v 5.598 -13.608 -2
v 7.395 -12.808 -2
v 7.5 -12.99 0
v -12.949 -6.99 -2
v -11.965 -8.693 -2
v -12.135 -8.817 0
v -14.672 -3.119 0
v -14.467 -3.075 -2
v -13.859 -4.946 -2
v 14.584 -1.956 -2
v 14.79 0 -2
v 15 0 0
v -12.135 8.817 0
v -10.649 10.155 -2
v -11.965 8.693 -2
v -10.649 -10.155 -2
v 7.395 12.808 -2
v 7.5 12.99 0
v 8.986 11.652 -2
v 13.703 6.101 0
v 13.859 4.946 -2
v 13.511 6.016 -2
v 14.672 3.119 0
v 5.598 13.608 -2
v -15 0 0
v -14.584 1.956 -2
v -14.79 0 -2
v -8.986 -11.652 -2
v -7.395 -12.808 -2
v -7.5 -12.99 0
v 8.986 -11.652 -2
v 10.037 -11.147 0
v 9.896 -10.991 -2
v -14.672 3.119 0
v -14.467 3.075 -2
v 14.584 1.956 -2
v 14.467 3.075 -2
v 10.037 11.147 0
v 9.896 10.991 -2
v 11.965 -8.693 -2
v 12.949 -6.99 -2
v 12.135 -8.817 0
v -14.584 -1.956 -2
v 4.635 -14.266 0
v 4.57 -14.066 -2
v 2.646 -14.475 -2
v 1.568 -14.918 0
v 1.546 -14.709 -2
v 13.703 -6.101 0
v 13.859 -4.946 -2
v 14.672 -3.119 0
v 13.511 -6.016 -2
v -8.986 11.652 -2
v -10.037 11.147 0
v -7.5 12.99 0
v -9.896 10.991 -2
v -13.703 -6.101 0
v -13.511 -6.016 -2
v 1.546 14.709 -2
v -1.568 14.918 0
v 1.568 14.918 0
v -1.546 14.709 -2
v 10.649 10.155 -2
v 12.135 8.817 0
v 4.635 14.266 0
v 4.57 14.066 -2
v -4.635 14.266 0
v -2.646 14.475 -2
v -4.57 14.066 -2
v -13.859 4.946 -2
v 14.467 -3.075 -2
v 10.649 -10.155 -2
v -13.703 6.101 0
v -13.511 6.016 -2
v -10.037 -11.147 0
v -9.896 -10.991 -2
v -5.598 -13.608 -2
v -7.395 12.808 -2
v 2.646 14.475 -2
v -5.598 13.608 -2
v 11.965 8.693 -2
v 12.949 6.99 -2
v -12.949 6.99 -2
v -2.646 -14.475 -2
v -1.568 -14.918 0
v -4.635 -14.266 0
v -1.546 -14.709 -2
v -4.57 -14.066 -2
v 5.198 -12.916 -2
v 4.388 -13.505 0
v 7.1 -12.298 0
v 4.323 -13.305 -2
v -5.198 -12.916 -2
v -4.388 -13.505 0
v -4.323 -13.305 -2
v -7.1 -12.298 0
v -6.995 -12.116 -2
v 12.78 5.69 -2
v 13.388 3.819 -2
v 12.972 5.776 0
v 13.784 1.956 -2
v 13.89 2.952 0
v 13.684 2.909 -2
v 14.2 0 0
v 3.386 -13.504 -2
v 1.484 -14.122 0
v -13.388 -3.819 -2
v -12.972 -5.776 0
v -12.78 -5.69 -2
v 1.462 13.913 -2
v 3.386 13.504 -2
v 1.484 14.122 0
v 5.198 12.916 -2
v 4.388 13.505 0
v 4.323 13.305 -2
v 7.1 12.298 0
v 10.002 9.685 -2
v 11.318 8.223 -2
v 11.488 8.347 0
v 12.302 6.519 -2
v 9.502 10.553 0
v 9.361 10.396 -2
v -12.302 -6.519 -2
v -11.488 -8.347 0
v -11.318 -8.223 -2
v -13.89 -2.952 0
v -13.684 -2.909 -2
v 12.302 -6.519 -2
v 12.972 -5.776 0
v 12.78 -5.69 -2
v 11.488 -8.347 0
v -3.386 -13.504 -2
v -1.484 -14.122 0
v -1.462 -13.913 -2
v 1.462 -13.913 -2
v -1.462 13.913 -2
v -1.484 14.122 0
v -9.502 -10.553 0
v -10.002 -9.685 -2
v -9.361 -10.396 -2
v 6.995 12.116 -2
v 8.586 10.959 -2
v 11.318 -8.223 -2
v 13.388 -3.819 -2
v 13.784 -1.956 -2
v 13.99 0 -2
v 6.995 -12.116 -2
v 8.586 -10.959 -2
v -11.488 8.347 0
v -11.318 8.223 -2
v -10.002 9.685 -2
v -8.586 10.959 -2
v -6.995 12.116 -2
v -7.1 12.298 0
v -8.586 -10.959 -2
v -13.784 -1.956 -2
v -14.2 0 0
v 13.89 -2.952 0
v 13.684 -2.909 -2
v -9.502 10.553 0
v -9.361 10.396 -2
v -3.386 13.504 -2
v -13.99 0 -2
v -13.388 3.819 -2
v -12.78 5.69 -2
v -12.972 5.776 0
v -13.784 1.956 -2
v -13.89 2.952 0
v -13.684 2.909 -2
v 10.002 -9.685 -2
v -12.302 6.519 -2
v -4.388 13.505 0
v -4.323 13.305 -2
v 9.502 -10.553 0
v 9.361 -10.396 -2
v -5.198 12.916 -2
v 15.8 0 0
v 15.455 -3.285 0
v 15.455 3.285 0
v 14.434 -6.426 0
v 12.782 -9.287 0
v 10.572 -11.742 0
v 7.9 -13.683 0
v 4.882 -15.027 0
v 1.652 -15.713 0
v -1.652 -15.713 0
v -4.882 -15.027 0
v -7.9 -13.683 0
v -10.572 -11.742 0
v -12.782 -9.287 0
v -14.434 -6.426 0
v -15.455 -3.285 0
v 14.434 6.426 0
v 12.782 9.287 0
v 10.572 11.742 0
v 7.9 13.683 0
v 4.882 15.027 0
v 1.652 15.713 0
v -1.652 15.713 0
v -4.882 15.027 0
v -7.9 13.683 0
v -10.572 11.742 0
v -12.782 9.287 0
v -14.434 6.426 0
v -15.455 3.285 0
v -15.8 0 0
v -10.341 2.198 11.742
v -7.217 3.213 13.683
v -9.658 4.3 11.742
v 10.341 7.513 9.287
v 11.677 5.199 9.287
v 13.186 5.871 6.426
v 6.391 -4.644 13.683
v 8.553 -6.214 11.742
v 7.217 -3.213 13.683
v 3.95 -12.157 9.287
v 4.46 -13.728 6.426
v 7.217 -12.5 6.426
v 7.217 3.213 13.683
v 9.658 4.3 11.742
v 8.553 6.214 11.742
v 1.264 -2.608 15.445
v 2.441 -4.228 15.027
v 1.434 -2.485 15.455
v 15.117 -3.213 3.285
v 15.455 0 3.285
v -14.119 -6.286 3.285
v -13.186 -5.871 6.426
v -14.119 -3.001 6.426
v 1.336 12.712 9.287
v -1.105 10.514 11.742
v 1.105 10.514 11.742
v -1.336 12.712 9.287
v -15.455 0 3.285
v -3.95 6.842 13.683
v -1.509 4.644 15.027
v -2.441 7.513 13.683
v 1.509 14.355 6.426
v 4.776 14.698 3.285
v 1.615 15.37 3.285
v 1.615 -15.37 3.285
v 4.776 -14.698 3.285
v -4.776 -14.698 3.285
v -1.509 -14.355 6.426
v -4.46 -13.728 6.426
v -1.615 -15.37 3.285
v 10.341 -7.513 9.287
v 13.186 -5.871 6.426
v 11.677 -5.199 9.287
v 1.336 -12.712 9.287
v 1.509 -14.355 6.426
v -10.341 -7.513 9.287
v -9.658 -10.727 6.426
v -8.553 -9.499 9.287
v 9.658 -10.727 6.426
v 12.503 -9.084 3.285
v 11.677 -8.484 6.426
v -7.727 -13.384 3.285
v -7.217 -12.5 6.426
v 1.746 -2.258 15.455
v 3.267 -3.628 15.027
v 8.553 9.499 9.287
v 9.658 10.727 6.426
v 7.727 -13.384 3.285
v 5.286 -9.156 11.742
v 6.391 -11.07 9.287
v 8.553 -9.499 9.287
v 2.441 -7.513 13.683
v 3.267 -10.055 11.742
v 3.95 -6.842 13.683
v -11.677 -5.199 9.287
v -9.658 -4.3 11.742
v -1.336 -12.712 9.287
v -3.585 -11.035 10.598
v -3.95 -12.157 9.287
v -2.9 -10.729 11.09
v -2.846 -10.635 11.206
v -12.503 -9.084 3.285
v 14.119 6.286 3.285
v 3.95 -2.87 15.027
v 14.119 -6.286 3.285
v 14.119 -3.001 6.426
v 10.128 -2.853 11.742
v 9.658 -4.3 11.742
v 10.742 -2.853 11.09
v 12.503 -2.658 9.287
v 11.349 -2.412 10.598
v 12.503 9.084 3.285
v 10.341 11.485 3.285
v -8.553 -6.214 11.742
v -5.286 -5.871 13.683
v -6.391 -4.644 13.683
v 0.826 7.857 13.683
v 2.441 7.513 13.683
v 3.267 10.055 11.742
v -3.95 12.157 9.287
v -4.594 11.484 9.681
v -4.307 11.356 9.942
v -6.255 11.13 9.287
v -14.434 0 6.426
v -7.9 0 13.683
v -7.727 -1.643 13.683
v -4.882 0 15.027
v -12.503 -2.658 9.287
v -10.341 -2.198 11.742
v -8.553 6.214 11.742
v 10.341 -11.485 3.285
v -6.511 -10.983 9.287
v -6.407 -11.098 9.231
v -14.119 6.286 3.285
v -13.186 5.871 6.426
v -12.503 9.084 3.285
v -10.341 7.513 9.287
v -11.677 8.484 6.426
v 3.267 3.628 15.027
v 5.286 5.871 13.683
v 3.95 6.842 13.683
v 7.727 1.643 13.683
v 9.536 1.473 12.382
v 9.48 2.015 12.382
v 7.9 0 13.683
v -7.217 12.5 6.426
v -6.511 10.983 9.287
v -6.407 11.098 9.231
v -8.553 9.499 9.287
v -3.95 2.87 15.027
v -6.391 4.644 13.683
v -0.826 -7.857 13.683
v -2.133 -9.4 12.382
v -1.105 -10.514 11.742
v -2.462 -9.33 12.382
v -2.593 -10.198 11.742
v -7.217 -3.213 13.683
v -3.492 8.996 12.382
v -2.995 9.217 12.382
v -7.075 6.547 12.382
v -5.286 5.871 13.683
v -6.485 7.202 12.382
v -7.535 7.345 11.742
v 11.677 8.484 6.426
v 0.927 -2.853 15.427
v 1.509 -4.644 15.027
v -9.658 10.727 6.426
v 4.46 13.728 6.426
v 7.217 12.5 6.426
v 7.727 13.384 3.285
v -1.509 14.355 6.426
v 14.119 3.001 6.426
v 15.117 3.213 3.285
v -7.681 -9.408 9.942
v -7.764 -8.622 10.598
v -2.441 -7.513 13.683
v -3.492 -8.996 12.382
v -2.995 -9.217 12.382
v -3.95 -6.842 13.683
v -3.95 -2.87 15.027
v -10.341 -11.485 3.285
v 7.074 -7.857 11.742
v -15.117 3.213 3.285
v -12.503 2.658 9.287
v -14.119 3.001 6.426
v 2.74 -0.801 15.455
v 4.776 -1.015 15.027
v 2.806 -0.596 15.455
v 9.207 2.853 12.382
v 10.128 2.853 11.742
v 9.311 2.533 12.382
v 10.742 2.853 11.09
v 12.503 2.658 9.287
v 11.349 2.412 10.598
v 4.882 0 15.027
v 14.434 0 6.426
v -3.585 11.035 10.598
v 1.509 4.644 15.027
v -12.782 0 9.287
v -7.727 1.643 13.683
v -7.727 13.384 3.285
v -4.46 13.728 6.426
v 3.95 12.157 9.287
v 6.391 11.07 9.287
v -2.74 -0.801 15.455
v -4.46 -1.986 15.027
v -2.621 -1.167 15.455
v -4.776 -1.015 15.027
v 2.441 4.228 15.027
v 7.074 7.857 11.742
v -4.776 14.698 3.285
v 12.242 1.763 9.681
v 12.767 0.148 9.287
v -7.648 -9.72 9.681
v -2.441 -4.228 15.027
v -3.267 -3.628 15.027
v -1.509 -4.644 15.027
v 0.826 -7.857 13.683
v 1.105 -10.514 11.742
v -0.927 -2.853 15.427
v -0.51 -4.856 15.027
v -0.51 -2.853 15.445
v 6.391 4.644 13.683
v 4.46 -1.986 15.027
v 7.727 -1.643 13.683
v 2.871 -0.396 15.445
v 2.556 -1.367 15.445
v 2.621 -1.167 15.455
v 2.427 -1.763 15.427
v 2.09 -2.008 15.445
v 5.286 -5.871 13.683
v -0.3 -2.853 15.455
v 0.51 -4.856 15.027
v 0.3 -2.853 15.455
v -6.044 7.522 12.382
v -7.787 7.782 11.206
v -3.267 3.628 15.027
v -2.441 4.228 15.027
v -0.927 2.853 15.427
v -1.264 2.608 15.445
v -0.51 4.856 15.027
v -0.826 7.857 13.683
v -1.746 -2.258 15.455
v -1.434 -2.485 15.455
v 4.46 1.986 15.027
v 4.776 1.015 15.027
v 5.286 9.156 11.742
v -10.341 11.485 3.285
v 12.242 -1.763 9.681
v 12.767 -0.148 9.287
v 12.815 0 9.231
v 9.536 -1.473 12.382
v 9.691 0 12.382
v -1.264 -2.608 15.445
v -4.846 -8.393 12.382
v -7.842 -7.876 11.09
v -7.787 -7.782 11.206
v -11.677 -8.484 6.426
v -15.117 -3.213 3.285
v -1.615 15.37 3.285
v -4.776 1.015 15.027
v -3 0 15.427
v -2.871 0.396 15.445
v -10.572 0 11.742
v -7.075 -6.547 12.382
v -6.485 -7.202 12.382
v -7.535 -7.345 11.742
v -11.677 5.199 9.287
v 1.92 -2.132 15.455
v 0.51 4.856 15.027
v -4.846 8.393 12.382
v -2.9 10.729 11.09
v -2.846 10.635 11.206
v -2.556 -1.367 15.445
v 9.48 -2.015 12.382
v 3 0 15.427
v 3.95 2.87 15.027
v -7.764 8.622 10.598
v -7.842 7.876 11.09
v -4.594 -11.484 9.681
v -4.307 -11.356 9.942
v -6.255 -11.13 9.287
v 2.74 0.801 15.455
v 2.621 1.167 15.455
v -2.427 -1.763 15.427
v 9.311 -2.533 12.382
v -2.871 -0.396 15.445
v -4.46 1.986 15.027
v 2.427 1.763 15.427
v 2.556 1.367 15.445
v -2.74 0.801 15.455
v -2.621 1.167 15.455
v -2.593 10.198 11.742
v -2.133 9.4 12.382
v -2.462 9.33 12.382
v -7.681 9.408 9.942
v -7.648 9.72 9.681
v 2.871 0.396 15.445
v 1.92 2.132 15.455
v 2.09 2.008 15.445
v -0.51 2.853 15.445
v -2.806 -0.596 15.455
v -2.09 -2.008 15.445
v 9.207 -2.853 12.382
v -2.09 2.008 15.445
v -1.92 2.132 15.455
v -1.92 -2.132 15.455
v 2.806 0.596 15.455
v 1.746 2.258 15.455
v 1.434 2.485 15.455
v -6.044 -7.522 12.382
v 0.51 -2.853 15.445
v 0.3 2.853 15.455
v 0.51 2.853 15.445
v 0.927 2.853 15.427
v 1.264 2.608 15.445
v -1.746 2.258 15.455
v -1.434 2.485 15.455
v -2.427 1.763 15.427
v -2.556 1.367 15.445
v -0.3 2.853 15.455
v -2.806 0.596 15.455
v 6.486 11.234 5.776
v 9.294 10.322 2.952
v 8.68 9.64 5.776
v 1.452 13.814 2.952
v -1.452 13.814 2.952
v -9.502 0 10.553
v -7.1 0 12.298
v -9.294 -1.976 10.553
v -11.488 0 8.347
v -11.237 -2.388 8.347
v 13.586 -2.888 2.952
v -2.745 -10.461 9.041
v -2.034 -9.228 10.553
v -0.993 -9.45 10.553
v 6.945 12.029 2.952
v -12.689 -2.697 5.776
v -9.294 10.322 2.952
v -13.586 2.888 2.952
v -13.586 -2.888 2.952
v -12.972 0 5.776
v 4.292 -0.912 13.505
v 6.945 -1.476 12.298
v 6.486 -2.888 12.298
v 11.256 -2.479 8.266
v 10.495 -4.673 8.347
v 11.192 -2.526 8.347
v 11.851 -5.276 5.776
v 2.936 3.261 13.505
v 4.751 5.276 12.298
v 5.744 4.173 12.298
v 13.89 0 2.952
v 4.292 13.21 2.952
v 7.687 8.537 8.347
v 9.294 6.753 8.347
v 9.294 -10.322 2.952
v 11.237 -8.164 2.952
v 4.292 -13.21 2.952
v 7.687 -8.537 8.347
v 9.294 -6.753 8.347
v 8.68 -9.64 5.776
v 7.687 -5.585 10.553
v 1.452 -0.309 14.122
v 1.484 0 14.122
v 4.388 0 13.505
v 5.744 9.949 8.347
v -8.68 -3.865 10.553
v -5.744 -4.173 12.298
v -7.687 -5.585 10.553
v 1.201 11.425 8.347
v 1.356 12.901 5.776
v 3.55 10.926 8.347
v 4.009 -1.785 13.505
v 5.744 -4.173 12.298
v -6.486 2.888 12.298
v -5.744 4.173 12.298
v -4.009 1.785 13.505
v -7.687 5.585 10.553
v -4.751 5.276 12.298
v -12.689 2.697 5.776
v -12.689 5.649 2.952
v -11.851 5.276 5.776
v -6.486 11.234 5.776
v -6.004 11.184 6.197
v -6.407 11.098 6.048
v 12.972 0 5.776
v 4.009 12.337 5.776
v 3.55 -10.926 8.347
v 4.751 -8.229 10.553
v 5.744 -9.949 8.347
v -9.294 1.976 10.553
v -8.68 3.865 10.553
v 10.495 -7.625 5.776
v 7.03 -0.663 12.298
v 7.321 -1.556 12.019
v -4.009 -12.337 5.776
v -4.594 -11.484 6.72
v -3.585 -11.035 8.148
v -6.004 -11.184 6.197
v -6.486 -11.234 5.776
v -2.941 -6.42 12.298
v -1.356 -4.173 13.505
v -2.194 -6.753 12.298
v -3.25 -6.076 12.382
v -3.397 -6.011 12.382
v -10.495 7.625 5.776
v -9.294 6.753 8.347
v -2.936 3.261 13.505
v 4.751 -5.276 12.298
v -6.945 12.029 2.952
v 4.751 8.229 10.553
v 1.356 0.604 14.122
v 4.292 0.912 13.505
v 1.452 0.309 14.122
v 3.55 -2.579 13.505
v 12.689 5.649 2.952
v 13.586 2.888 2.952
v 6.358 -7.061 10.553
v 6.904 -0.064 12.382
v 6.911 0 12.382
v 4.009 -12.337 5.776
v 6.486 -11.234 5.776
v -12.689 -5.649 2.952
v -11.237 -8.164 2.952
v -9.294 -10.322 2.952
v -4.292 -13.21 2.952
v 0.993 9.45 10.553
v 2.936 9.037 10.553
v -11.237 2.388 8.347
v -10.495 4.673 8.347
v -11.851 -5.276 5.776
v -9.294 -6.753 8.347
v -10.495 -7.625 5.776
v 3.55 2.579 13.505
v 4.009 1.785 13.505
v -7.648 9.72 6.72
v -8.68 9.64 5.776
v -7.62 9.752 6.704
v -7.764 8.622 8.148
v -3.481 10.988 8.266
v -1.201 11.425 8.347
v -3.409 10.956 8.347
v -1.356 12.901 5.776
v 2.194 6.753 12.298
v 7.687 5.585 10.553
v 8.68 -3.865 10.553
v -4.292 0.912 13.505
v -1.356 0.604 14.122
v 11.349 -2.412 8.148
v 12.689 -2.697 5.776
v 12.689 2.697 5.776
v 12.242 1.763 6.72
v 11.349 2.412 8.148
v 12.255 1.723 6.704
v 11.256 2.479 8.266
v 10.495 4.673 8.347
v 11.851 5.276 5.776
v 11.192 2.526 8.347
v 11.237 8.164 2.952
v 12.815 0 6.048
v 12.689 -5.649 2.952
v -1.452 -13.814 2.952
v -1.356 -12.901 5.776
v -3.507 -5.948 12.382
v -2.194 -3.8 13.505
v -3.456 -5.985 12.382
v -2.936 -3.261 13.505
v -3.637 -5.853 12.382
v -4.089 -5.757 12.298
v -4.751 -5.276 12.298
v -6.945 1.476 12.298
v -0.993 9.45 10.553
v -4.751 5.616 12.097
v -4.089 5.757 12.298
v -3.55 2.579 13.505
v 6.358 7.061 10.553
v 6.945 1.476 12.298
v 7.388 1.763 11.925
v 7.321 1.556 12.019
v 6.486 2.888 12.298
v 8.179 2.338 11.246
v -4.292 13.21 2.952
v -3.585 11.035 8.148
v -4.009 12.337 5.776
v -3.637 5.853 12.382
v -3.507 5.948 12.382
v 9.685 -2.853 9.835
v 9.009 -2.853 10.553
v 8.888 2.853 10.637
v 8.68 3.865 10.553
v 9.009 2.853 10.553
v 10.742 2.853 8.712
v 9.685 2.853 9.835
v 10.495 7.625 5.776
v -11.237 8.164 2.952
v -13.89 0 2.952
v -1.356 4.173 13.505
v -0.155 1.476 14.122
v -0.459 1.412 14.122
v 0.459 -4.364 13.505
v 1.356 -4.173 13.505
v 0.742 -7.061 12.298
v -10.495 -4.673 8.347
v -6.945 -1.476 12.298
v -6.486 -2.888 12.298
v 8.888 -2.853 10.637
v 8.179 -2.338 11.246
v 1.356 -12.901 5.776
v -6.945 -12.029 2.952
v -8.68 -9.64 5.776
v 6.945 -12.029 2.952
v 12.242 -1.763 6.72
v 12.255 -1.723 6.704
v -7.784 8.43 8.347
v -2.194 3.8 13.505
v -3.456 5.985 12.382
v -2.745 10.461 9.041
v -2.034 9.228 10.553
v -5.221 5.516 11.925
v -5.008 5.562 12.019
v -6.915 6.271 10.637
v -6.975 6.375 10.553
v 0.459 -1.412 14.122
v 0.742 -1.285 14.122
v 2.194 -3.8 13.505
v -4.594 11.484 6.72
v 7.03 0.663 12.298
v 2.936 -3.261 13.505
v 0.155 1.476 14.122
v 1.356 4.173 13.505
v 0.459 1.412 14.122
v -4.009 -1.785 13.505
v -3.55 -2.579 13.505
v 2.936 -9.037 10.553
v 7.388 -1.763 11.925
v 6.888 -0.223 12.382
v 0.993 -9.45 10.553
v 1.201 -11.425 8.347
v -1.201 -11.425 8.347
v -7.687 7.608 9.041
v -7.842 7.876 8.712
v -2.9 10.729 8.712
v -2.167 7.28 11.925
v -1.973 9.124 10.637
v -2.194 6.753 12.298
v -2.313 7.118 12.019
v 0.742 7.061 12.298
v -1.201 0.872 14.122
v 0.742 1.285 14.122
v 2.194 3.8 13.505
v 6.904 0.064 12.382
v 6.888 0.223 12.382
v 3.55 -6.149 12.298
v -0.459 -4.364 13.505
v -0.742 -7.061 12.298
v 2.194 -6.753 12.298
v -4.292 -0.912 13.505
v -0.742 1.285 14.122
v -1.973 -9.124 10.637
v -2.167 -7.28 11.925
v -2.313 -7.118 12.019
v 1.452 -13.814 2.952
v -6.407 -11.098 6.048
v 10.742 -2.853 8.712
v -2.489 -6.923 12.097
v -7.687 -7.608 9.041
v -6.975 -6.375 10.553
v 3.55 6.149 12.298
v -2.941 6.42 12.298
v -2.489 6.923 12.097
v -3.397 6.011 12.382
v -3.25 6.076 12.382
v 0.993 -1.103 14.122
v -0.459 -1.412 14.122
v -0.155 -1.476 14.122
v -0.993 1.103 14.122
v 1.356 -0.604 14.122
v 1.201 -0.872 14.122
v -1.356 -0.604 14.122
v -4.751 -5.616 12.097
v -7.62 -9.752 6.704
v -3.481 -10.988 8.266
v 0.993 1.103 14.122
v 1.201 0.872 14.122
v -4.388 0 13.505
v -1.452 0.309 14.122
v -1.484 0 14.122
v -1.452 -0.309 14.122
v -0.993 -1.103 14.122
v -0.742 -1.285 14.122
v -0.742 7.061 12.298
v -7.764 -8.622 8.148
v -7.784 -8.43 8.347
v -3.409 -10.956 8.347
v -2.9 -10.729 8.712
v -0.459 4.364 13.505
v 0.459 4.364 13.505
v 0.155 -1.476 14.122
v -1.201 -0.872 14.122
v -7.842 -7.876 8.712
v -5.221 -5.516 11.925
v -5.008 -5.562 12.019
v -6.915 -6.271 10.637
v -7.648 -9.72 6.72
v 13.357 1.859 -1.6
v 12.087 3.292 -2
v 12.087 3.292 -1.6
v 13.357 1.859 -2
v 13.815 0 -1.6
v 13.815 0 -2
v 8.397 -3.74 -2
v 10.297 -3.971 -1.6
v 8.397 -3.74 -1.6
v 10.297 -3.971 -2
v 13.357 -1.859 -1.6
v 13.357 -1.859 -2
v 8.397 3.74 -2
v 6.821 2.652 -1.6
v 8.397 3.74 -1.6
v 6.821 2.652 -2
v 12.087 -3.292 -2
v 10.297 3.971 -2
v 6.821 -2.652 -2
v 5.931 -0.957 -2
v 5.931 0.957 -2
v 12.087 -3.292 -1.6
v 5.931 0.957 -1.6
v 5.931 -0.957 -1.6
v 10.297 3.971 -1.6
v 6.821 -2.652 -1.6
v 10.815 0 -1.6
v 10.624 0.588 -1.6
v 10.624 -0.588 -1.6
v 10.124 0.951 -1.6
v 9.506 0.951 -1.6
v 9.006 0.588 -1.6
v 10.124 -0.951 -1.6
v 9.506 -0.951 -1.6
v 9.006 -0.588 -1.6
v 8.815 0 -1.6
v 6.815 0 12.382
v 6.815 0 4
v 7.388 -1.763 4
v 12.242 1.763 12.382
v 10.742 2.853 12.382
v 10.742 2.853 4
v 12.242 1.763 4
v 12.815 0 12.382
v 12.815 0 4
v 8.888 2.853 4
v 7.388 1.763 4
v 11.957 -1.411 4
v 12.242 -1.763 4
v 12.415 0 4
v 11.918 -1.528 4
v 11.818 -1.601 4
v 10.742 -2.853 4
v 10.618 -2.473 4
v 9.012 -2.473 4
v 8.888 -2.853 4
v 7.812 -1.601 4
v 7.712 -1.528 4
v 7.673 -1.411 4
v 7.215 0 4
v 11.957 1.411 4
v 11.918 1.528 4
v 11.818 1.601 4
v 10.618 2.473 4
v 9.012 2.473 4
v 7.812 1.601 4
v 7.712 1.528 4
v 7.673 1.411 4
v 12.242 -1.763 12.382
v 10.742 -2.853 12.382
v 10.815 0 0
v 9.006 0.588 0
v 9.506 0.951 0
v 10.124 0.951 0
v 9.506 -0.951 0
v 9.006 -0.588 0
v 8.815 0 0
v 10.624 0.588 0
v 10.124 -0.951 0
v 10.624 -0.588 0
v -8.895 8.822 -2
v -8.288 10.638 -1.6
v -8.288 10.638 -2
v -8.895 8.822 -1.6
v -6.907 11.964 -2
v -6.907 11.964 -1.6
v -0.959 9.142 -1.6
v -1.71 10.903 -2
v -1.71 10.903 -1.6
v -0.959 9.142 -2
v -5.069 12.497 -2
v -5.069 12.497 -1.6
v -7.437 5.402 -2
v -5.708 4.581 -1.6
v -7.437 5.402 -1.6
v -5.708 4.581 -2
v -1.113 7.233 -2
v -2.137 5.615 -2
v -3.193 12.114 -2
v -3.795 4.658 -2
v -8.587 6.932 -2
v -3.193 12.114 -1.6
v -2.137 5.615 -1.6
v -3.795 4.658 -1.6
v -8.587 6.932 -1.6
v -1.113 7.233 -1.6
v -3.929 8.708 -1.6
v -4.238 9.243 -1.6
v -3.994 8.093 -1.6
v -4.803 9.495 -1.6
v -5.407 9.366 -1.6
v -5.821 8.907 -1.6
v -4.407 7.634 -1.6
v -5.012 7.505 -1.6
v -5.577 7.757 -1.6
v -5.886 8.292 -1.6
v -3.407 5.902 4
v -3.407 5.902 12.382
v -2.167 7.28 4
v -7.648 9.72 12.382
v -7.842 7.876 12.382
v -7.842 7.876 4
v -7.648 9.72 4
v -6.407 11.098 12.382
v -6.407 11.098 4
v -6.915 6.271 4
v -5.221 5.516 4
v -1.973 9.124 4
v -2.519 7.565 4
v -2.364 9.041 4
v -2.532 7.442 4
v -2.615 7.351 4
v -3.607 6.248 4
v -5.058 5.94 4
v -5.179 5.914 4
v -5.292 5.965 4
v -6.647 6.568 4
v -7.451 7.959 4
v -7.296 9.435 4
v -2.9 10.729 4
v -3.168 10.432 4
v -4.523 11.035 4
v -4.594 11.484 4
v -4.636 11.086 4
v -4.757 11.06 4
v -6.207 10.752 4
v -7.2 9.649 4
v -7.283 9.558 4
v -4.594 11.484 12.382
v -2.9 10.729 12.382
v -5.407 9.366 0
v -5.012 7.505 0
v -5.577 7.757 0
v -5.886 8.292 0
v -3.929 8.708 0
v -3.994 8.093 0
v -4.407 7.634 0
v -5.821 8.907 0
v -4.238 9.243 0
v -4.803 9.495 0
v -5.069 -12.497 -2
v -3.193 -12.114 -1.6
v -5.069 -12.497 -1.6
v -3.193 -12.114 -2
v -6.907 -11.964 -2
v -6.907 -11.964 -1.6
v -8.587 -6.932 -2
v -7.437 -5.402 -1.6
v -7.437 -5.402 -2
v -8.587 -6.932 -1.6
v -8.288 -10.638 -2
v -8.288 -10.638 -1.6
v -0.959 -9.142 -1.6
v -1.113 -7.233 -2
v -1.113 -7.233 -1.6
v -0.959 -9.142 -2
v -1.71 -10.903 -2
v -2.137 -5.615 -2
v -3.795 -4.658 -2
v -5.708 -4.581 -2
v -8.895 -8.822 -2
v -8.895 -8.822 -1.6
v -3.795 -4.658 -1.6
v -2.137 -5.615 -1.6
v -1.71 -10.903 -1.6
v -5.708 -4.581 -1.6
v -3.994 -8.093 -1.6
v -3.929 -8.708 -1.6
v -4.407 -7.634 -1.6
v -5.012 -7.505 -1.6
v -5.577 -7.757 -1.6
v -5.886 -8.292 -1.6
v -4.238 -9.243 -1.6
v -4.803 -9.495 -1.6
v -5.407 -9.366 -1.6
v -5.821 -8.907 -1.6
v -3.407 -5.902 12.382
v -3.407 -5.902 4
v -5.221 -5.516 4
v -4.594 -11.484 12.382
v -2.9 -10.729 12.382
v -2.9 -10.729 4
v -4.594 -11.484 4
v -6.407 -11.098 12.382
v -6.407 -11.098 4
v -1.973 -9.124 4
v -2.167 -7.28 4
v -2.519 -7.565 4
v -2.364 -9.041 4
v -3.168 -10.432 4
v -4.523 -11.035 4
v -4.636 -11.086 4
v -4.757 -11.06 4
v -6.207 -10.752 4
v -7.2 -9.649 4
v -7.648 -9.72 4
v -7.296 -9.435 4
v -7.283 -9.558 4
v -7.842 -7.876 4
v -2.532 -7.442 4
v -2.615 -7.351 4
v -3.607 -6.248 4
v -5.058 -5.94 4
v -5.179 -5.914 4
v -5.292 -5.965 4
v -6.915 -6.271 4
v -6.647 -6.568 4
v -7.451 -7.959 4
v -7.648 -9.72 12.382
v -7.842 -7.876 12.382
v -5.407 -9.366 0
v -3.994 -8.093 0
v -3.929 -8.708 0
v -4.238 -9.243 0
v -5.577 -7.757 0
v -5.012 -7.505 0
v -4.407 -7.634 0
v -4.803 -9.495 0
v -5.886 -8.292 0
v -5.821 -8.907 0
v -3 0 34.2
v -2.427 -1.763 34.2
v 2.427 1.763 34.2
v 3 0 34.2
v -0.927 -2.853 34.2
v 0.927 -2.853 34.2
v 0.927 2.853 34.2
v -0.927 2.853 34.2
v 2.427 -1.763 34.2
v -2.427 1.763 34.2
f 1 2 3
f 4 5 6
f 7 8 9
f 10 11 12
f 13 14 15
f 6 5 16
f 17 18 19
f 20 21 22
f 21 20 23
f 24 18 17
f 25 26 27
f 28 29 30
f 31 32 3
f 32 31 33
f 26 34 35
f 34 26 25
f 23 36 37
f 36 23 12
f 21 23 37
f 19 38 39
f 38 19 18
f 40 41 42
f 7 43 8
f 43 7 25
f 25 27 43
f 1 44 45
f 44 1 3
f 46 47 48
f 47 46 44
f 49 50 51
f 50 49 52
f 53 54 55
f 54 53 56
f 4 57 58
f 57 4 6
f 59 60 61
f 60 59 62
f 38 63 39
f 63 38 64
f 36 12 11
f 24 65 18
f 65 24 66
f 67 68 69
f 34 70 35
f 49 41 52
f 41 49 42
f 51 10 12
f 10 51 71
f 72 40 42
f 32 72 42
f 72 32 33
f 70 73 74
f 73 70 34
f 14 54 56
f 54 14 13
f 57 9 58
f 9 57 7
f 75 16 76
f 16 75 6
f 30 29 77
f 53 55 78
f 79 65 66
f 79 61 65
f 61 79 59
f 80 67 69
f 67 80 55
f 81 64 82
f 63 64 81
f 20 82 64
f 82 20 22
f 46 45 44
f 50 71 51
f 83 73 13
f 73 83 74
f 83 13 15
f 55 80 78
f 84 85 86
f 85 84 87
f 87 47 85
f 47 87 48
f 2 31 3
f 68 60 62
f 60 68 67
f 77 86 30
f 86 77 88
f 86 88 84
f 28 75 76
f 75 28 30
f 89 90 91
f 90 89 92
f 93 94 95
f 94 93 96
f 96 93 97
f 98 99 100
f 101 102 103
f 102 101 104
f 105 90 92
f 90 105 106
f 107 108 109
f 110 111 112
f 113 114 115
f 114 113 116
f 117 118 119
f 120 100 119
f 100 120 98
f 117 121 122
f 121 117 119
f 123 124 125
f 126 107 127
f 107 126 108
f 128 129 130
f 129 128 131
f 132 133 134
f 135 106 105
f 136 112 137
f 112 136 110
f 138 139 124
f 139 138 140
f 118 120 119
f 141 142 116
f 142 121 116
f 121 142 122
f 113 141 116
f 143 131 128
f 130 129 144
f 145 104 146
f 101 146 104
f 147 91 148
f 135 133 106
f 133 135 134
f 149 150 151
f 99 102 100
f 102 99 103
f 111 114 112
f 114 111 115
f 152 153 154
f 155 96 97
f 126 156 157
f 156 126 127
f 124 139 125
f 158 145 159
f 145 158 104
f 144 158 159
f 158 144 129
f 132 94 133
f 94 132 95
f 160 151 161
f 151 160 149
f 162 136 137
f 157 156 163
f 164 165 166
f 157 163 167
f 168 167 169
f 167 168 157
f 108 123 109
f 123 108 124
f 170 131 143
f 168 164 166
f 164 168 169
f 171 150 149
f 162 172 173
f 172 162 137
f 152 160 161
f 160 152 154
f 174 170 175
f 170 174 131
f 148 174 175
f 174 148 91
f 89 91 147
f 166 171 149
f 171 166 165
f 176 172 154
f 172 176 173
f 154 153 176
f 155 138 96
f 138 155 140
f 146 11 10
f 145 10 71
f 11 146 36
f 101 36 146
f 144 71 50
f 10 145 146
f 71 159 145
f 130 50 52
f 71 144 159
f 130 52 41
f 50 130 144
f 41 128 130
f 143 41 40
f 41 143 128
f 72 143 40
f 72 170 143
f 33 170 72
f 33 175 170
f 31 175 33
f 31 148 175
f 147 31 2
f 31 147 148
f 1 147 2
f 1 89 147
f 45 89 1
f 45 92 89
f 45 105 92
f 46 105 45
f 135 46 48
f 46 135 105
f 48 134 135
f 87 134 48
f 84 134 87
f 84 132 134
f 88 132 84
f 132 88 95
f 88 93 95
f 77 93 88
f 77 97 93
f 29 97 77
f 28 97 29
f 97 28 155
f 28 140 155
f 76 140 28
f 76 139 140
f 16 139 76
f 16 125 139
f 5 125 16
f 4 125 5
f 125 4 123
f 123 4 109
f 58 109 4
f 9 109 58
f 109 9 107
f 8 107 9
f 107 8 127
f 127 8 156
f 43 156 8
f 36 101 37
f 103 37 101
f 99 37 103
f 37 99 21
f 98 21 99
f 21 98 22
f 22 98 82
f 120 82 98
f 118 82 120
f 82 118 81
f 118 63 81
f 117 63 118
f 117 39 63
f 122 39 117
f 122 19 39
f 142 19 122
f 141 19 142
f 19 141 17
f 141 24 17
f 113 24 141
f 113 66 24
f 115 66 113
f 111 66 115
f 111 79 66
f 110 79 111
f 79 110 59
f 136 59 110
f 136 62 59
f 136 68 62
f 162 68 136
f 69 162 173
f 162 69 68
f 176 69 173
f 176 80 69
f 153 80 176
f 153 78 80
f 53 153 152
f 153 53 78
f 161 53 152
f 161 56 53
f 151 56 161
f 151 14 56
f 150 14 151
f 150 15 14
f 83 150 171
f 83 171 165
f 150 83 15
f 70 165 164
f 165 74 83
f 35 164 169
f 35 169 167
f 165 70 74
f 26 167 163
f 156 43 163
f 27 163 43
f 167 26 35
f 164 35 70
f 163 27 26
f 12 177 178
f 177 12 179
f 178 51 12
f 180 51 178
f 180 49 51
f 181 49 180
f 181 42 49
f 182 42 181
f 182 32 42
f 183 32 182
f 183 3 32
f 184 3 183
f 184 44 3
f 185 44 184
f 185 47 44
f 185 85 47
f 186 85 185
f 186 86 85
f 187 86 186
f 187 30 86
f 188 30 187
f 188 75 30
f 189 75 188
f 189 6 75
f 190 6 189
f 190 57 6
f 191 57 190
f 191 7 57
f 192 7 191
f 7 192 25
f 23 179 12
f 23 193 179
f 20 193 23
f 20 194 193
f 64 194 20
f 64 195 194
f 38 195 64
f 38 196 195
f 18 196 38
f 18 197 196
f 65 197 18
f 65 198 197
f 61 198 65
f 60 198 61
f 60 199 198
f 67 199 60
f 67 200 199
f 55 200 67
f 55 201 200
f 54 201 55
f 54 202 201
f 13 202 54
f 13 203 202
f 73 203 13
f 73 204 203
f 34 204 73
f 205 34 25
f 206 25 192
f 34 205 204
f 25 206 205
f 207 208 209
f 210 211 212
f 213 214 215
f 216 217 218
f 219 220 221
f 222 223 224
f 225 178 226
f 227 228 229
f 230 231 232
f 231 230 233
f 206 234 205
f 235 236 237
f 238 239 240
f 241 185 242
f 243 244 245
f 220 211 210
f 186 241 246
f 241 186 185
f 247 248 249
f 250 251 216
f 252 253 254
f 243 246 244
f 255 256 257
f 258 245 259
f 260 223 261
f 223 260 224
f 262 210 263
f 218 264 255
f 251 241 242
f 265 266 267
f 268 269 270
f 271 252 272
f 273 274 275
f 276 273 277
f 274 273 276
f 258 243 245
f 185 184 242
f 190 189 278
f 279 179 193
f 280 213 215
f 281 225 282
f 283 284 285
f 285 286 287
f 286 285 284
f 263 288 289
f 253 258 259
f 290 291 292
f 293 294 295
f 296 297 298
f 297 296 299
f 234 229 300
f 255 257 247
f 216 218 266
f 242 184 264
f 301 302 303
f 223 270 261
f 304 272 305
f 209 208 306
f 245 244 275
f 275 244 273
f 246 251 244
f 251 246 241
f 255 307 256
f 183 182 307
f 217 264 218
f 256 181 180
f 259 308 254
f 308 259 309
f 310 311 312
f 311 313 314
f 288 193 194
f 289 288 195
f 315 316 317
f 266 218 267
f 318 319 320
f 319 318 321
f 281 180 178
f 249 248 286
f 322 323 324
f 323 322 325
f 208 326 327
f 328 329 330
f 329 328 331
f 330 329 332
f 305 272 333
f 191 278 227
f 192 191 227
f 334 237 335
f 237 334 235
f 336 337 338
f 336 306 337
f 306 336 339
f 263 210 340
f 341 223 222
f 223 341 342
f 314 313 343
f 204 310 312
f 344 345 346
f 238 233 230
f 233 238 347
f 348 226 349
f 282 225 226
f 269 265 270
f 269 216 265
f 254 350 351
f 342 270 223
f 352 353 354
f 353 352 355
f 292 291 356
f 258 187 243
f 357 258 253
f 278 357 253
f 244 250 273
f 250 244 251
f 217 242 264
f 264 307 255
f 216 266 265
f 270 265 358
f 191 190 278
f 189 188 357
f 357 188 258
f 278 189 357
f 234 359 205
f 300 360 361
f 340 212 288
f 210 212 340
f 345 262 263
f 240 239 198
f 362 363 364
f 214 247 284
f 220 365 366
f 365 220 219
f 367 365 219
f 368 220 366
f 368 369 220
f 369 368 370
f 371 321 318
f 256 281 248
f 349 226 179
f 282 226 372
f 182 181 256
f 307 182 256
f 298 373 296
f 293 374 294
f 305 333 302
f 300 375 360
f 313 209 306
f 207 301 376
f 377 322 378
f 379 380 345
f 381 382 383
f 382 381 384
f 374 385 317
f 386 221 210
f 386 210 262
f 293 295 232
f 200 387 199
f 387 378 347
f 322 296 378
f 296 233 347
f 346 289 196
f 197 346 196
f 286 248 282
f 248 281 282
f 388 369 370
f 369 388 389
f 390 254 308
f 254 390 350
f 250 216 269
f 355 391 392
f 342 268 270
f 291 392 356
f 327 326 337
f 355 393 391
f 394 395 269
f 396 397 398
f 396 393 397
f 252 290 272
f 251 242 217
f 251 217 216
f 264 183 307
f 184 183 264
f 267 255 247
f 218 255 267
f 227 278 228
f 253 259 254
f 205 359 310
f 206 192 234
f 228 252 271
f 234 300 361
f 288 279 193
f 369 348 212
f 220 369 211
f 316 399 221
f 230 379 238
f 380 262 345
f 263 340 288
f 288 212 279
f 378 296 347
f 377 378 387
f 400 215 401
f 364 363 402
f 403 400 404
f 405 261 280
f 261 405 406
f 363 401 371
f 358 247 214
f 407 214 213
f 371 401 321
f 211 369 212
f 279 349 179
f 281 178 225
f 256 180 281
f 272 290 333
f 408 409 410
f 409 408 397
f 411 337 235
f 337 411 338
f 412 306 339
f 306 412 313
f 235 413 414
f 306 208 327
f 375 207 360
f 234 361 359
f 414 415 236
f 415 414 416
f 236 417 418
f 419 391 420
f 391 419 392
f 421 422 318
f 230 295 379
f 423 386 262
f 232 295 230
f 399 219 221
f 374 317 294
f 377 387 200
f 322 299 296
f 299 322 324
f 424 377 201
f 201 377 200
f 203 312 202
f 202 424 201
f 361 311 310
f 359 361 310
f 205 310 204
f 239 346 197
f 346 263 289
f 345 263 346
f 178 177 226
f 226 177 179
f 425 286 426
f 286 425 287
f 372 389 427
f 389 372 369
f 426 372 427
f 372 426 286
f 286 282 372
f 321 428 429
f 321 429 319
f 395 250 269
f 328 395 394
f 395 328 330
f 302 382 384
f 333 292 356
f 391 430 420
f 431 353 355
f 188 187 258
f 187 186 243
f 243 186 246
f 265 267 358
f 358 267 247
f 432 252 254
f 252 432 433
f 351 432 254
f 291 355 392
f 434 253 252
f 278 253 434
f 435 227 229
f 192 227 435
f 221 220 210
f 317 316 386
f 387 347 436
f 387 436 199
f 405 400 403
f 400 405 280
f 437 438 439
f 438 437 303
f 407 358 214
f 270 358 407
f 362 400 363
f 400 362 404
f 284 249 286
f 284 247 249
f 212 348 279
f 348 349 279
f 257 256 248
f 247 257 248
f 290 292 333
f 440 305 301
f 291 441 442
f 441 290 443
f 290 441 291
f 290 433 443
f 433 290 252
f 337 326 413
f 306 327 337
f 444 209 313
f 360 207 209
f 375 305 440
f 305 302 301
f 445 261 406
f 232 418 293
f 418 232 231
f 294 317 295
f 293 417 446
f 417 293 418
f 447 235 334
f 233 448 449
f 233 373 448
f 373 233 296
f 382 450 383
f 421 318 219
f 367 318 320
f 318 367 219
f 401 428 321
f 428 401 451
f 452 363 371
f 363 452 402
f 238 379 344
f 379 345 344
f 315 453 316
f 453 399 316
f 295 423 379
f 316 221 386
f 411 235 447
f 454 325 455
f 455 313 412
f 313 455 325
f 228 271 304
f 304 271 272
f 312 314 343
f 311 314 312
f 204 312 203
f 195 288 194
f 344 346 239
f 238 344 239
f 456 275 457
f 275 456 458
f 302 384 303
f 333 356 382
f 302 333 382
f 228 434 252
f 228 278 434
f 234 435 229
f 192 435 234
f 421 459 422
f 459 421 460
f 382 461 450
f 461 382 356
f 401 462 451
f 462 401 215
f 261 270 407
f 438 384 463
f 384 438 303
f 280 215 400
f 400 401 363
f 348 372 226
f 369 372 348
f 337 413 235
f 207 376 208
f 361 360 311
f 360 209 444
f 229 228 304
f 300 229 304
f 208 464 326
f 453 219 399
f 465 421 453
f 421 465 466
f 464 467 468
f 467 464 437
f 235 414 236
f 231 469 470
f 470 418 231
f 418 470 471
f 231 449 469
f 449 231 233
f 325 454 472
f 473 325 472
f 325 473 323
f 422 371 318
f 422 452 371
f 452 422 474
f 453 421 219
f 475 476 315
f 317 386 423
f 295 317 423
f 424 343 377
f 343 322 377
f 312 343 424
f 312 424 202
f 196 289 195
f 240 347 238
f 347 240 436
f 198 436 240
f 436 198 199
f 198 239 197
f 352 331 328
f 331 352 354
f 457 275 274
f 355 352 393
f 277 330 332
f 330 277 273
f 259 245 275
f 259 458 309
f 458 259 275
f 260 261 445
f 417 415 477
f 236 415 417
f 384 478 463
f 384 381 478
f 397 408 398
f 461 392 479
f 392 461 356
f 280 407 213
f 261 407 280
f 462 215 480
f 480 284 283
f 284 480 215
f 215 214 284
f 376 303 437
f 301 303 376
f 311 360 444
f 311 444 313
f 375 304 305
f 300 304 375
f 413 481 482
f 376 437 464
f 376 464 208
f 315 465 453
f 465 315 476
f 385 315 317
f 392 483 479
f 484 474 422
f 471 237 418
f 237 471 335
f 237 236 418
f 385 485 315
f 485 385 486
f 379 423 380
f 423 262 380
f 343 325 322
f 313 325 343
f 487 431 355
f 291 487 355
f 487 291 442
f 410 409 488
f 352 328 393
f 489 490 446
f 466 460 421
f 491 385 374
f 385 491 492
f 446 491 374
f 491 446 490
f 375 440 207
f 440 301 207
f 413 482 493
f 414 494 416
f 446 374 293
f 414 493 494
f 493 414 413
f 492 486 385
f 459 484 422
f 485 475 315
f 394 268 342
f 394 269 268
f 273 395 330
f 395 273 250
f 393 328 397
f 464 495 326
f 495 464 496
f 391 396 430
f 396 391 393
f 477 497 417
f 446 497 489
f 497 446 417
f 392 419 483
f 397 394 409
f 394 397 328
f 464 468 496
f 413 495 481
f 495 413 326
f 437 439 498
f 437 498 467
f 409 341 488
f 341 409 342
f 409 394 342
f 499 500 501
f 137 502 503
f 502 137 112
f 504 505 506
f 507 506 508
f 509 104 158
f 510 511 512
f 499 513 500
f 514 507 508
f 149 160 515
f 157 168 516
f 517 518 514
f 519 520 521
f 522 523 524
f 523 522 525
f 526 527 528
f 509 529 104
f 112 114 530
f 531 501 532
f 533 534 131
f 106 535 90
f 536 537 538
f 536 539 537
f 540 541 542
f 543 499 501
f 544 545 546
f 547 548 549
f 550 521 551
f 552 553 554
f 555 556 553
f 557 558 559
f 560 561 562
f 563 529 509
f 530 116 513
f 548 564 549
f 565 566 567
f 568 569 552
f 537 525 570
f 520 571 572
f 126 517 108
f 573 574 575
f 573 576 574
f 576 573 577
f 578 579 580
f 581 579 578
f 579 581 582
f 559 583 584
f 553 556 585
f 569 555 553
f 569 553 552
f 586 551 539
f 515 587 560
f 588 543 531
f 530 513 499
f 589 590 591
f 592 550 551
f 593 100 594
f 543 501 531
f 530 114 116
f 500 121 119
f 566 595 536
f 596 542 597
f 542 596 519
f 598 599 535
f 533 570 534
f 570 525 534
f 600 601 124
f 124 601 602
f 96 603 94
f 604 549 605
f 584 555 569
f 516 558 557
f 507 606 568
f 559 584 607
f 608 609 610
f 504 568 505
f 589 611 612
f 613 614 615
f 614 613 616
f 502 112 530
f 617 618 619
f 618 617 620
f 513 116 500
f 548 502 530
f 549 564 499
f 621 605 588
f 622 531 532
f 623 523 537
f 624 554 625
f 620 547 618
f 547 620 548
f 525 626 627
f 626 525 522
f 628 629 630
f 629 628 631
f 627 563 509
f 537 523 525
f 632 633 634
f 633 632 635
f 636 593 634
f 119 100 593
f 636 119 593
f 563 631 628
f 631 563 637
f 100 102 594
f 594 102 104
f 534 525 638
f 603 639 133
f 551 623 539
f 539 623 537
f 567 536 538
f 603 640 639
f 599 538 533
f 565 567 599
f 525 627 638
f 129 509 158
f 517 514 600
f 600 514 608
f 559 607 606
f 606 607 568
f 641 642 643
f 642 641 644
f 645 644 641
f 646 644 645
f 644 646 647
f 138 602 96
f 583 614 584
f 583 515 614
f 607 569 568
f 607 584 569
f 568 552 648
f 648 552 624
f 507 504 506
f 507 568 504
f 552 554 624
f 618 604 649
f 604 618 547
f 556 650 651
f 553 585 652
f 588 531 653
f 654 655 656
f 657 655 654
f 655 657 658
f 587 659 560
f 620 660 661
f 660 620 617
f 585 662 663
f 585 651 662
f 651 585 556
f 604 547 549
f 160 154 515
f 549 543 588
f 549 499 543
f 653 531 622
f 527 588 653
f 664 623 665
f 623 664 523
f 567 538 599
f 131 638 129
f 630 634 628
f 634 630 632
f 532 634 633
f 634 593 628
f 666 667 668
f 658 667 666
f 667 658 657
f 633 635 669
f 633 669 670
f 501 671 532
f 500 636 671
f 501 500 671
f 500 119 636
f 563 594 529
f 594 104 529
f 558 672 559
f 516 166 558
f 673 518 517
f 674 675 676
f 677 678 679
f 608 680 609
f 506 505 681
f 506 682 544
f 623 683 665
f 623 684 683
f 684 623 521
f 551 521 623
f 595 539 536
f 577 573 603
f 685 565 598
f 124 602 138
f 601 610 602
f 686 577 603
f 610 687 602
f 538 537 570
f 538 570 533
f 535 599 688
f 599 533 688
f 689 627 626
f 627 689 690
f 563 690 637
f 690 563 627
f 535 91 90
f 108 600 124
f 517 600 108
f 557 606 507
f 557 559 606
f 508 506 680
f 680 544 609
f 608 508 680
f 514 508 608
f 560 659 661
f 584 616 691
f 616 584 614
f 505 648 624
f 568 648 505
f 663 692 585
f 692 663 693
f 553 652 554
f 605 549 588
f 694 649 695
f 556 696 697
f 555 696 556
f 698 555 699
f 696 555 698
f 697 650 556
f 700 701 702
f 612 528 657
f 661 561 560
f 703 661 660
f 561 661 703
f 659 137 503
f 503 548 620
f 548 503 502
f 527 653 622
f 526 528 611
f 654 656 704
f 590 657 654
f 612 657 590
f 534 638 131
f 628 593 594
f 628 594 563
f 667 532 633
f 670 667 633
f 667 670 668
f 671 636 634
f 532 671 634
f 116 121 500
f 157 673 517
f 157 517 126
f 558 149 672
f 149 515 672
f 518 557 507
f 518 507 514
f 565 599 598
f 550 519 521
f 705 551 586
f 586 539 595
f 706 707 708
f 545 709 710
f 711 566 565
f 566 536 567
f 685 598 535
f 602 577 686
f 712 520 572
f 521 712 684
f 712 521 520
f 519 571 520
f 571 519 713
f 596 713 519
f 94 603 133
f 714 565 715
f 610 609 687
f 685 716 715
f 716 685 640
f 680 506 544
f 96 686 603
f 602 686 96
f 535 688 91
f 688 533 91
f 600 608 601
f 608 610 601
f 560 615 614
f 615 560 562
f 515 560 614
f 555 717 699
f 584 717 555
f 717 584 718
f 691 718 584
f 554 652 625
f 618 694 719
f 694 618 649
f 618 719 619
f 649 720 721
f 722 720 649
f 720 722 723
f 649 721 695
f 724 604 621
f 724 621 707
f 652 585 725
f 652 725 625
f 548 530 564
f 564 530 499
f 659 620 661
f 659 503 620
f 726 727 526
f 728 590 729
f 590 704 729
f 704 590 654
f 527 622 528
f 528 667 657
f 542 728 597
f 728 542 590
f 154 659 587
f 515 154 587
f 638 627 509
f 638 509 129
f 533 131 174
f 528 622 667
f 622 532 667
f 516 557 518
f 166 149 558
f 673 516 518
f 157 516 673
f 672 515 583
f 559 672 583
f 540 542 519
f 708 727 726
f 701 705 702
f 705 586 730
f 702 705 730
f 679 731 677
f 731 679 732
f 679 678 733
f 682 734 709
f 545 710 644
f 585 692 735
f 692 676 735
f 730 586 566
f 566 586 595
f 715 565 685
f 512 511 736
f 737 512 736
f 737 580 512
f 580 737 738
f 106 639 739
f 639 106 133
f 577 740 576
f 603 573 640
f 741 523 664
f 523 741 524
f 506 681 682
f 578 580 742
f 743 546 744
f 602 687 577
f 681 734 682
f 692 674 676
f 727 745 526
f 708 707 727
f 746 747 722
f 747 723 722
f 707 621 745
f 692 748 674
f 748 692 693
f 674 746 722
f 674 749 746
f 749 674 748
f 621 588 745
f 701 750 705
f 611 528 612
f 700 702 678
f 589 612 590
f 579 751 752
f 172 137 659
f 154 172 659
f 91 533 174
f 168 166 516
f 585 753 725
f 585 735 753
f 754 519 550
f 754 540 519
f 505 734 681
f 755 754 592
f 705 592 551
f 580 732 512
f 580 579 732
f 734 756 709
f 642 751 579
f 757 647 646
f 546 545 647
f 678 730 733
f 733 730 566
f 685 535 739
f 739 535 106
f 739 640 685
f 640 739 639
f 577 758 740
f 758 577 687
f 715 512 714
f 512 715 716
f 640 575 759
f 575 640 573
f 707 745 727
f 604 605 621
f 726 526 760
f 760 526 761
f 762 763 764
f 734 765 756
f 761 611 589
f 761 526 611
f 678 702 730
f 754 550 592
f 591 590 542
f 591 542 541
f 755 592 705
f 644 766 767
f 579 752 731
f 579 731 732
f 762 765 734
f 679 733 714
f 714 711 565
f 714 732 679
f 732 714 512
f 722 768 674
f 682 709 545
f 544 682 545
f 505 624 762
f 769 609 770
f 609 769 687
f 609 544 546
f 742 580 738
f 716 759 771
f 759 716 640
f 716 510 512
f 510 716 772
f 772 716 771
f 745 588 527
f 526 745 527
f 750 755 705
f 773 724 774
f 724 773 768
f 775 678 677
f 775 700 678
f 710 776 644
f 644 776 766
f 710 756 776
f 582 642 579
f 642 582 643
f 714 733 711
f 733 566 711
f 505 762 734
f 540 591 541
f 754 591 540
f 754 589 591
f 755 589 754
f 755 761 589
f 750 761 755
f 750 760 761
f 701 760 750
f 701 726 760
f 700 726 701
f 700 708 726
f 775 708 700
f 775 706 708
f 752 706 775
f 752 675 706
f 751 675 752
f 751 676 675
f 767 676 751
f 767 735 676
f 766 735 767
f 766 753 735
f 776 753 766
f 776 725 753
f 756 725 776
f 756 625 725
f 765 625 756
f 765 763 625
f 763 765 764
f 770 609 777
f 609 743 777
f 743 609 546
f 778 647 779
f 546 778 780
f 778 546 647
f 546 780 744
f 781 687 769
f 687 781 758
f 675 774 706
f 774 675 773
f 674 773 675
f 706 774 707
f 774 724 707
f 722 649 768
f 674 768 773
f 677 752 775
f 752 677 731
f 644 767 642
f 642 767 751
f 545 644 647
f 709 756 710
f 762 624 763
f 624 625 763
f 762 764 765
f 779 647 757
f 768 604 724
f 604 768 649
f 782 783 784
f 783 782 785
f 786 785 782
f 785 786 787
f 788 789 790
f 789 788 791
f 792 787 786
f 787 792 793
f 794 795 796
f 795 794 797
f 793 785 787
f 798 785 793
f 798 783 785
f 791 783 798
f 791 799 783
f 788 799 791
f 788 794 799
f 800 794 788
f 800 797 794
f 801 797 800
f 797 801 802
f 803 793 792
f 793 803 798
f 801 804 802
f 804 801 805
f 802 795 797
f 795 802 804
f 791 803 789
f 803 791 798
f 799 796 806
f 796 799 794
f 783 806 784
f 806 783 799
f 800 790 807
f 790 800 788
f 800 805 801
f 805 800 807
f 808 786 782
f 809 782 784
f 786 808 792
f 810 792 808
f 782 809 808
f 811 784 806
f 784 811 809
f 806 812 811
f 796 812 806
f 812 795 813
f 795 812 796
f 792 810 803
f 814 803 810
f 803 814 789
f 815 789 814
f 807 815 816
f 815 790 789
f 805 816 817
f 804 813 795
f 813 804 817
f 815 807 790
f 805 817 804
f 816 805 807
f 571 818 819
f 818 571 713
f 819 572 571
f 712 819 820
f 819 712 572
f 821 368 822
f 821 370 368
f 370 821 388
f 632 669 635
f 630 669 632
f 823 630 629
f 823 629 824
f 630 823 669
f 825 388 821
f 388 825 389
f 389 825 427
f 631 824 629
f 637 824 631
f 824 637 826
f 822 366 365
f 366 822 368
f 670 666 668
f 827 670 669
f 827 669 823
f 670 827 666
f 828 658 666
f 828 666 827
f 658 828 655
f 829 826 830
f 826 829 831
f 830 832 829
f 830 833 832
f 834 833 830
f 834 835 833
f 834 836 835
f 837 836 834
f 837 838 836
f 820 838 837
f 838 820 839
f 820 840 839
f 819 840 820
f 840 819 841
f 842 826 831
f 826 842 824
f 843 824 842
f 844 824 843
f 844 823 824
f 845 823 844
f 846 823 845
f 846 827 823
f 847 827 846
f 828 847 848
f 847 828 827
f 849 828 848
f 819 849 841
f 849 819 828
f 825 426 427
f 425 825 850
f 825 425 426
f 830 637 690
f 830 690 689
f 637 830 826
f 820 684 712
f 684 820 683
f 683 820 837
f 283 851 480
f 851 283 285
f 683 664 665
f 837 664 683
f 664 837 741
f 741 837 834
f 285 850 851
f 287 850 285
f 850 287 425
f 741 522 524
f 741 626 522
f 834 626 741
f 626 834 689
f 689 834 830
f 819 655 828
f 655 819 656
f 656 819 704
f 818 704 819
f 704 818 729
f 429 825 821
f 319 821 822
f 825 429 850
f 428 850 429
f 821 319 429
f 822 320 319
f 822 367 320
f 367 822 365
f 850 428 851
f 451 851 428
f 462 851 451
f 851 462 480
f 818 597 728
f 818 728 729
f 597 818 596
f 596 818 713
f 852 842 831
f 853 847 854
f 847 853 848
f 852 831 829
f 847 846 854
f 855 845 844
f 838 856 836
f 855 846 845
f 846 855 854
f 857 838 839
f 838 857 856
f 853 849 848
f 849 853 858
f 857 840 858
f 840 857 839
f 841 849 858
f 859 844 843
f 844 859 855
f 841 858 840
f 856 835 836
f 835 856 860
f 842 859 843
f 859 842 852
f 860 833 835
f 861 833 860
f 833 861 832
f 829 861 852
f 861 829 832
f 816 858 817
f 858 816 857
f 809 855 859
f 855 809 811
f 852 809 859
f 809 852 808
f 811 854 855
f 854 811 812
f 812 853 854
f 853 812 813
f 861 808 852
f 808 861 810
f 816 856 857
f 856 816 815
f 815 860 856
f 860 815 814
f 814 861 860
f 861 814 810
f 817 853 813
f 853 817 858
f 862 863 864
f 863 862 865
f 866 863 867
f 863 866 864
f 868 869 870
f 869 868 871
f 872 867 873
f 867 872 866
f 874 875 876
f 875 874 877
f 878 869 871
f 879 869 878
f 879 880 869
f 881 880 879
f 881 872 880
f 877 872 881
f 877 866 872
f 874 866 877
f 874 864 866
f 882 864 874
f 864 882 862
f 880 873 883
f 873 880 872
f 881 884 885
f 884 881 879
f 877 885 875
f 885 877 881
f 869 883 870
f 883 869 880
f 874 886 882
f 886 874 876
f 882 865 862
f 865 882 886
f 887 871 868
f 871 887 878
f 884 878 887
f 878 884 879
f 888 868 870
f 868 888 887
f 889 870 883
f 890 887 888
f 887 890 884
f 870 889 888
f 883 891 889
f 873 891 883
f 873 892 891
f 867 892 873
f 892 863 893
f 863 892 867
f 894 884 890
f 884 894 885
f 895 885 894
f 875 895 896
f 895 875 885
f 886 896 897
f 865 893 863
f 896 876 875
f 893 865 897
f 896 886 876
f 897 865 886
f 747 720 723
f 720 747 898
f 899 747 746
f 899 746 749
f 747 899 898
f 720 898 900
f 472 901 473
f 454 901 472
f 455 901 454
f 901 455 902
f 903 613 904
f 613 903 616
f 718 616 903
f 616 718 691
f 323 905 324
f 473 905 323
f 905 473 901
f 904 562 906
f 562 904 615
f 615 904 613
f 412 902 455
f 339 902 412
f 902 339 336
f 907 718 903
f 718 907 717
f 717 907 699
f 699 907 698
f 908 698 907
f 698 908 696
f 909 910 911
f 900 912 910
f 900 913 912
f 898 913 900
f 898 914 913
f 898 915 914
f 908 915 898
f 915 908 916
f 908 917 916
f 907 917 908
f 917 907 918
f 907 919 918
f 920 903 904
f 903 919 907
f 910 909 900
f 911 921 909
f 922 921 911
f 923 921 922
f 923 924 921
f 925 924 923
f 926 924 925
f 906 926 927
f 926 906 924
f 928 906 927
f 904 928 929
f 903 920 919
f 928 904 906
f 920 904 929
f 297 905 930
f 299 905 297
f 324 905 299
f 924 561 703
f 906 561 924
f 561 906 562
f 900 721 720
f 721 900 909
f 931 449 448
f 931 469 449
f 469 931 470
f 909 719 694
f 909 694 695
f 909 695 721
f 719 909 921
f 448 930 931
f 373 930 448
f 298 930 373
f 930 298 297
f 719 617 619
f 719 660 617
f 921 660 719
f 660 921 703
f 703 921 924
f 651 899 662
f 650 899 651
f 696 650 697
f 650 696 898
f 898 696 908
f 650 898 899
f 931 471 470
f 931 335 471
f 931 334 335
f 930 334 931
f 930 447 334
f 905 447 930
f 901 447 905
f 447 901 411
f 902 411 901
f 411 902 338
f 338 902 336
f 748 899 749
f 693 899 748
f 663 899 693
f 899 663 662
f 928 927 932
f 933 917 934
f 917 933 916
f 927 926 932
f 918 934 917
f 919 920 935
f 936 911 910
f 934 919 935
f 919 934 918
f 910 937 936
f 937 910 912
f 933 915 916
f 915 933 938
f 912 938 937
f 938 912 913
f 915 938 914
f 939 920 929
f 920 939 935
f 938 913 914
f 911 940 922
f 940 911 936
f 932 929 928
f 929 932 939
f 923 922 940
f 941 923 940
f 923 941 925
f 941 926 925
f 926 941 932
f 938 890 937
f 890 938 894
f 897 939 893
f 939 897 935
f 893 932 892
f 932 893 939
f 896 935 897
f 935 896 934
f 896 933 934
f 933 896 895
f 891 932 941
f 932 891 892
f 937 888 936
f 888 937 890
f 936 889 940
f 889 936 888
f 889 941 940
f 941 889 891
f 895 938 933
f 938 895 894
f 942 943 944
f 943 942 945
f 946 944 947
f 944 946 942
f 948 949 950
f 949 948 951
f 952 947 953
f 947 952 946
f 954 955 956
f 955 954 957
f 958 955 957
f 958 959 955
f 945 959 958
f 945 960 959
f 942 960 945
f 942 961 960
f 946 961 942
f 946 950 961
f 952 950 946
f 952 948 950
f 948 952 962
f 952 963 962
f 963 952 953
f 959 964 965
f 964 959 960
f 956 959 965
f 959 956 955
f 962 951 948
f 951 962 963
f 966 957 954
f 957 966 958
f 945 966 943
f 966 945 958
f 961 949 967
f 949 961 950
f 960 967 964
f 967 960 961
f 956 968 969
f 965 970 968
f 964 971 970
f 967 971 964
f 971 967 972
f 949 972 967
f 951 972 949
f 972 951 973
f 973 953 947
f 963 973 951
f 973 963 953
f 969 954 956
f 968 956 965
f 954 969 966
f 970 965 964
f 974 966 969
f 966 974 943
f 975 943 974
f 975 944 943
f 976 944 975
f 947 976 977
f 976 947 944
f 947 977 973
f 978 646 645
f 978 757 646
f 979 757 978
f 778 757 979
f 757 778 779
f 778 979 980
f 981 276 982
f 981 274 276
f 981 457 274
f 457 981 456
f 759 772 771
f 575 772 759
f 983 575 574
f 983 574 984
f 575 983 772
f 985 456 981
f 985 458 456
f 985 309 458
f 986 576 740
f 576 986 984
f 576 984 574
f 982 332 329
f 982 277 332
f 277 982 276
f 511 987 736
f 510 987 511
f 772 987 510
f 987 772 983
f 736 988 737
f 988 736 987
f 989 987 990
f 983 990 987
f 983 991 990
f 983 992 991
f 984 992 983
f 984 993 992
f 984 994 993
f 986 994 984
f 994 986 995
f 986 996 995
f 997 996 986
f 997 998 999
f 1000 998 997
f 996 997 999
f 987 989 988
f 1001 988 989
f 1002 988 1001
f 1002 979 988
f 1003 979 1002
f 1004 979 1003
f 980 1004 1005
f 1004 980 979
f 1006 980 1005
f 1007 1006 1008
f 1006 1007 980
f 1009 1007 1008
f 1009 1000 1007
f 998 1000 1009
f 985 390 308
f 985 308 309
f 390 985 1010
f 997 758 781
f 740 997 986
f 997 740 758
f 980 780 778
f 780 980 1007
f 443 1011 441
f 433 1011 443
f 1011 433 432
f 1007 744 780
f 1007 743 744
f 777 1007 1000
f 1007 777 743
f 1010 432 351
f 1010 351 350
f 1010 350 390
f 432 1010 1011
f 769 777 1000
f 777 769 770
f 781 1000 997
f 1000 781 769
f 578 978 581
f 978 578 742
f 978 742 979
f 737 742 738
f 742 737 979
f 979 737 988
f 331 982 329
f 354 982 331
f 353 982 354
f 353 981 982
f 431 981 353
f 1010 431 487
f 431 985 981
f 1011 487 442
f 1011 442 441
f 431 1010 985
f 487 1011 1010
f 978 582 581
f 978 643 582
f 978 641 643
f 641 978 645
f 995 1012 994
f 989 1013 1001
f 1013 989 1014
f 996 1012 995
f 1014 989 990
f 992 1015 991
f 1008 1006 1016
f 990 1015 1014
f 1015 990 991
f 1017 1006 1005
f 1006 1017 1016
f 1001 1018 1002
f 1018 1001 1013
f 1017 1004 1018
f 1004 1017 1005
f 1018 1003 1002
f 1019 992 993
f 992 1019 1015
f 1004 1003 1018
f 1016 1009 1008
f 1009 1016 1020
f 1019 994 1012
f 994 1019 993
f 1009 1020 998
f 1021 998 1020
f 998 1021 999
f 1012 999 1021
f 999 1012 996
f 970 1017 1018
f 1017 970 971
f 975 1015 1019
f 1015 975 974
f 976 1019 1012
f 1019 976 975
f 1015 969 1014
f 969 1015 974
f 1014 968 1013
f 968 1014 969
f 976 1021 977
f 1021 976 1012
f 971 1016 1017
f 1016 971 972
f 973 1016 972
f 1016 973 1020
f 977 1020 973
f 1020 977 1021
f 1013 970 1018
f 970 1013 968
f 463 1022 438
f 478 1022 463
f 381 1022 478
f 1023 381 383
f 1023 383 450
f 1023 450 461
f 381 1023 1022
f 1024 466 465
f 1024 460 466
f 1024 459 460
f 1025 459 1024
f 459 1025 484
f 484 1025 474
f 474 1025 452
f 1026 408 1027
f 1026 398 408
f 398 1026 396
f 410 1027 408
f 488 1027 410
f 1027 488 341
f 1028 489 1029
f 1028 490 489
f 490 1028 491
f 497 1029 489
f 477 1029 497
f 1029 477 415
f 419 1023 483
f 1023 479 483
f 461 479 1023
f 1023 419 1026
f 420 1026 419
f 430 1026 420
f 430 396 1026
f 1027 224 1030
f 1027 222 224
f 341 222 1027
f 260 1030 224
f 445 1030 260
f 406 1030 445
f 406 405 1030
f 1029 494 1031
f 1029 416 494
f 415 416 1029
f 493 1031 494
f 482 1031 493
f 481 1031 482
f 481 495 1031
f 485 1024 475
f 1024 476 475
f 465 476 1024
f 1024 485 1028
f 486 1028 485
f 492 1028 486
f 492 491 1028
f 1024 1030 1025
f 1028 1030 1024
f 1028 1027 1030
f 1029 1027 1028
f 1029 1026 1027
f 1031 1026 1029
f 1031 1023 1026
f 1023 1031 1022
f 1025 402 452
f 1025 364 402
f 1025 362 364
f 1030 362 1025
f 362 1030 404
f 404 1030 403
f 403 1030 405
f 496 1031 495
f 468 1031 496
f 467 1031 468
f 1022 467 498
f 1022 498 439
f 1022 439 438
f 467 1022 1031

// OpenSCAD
// Licence: Creative Commons, Attribution, Non-commercial
// Created: 15-02-2013 by bmcage http://www.thingiverse.com/bmcage

// radius of the printplate
radpp = 15;
// radius of the holes in printplate                
radholepp = 1;
// thickness of the shell, take eg 2x your nozzle diam. This is thickness of the lip, sphere will have twice this thickness!        
thickshell = 0.8;
radius = radpp + thickshell;
// holes in PCB are on an equilateral triangle. Give side in mm
sidetria = 17;            
radtriacircum = sidetria/sqrt(3);

//there are two possible parts
part = "base";           // [base, top_1] 

//height of the lip that is used to click both parts together
lipheight = 2;

//add a drillholder pin on the base or not/
drill_holder = "yes";    // [yes, no]
//height of the drillholder
drill_height = 20;
//diameter of the drill bit
drill_size = 6; 

use <MCAD/regular_shapes.scad> 

module lip()
{
intersection()
  {
   translate([-1.5*radius, -1.5 *radius, 0])
           cube(size=[radius * 3, radius * 3, lipheight]);
   difference(){sphere(radius-thickshell); sphere(radius-2*thickshell);}
   }
}

module pin()
{union(){
  translate([radtriacircum,0,lipheight-0.4])cylinder(r1=4, r2=4, h=0.4);
  translate([radtriacircum, 0 , -sqrt(radius*radius-radtriacircum*radtriacircum)])
    cylinder(r1=3*radholepp, r2=3*radholepp, h=sqrt(radius*radius-radtriacircum*radtriacircum)+lipheight-2-4, $fn=10);
  translate([radtriacircum, 0 , -5])
    cylinder(r1=3*radholepp, r2=radholepp, h=5, $fn=10);
  translate([radtriacircum, 0 , -1])
    cylinder(r1=radholepp, r2=radholepp, h=lipheight+1, $fn=10);
  }
}

module holder()
{
union()
  {
  lip();
  intersection()
    {
    translate([-1.5*radius, -1.5 *radius, -2*radius])
              cube(size=[radius * 3, radius * 3, 2*radius]);
	 difference(){sphere(radius); sphere(radius-2*thickshell);}
    }
  pin();
  rotate([0,0,120]) pin();
  rotate([0,0,-120]) pin();
  if (drill_holder == "yes") {
    translate([0,0,-radius+2*thickshell]) mirror([0,0,-1]) cylinder(r=drill_size/2, h=drill_height, $fn=10);
    }
  }
}

module holderheadbase()
{
    intersection() 
    {
    translate([-1.5*radius, -1.5 *radius, 0])
      cube(size=[radius * 3, radius * 3, 2*radius]);
	 difference(){sphere(radius); sphere(radius-thickshell);}
    }
}

module holderhead()
{
  difference()
  {holderheadbase();
   linear_extrude(height=2*radius) hexagon(2);
   rotate([45,0,0])cylinder(r=2, h=2*radius, $fn=10);
   rotate([45,0,60])cylinder(r=2, h=2*radius, $fn=10);
   rotate([45,0,120])cylinder(r=2, h=2*radius, $fn=10);
   rotate([45,0,180])cylinder(r=2, h=2*radius, $fn=10);
   rotate([45,0,240])cylinder(r=2, h=2*radius, $fn=10);
   rotate([45,0,300])cylinder(r=2, h=2*radius, $fn=10);
  }
}

if (part=="base")
{
  mirror([0,0,1])holder();
} 
if (part == "top_1")
{
  holderhead();
}
